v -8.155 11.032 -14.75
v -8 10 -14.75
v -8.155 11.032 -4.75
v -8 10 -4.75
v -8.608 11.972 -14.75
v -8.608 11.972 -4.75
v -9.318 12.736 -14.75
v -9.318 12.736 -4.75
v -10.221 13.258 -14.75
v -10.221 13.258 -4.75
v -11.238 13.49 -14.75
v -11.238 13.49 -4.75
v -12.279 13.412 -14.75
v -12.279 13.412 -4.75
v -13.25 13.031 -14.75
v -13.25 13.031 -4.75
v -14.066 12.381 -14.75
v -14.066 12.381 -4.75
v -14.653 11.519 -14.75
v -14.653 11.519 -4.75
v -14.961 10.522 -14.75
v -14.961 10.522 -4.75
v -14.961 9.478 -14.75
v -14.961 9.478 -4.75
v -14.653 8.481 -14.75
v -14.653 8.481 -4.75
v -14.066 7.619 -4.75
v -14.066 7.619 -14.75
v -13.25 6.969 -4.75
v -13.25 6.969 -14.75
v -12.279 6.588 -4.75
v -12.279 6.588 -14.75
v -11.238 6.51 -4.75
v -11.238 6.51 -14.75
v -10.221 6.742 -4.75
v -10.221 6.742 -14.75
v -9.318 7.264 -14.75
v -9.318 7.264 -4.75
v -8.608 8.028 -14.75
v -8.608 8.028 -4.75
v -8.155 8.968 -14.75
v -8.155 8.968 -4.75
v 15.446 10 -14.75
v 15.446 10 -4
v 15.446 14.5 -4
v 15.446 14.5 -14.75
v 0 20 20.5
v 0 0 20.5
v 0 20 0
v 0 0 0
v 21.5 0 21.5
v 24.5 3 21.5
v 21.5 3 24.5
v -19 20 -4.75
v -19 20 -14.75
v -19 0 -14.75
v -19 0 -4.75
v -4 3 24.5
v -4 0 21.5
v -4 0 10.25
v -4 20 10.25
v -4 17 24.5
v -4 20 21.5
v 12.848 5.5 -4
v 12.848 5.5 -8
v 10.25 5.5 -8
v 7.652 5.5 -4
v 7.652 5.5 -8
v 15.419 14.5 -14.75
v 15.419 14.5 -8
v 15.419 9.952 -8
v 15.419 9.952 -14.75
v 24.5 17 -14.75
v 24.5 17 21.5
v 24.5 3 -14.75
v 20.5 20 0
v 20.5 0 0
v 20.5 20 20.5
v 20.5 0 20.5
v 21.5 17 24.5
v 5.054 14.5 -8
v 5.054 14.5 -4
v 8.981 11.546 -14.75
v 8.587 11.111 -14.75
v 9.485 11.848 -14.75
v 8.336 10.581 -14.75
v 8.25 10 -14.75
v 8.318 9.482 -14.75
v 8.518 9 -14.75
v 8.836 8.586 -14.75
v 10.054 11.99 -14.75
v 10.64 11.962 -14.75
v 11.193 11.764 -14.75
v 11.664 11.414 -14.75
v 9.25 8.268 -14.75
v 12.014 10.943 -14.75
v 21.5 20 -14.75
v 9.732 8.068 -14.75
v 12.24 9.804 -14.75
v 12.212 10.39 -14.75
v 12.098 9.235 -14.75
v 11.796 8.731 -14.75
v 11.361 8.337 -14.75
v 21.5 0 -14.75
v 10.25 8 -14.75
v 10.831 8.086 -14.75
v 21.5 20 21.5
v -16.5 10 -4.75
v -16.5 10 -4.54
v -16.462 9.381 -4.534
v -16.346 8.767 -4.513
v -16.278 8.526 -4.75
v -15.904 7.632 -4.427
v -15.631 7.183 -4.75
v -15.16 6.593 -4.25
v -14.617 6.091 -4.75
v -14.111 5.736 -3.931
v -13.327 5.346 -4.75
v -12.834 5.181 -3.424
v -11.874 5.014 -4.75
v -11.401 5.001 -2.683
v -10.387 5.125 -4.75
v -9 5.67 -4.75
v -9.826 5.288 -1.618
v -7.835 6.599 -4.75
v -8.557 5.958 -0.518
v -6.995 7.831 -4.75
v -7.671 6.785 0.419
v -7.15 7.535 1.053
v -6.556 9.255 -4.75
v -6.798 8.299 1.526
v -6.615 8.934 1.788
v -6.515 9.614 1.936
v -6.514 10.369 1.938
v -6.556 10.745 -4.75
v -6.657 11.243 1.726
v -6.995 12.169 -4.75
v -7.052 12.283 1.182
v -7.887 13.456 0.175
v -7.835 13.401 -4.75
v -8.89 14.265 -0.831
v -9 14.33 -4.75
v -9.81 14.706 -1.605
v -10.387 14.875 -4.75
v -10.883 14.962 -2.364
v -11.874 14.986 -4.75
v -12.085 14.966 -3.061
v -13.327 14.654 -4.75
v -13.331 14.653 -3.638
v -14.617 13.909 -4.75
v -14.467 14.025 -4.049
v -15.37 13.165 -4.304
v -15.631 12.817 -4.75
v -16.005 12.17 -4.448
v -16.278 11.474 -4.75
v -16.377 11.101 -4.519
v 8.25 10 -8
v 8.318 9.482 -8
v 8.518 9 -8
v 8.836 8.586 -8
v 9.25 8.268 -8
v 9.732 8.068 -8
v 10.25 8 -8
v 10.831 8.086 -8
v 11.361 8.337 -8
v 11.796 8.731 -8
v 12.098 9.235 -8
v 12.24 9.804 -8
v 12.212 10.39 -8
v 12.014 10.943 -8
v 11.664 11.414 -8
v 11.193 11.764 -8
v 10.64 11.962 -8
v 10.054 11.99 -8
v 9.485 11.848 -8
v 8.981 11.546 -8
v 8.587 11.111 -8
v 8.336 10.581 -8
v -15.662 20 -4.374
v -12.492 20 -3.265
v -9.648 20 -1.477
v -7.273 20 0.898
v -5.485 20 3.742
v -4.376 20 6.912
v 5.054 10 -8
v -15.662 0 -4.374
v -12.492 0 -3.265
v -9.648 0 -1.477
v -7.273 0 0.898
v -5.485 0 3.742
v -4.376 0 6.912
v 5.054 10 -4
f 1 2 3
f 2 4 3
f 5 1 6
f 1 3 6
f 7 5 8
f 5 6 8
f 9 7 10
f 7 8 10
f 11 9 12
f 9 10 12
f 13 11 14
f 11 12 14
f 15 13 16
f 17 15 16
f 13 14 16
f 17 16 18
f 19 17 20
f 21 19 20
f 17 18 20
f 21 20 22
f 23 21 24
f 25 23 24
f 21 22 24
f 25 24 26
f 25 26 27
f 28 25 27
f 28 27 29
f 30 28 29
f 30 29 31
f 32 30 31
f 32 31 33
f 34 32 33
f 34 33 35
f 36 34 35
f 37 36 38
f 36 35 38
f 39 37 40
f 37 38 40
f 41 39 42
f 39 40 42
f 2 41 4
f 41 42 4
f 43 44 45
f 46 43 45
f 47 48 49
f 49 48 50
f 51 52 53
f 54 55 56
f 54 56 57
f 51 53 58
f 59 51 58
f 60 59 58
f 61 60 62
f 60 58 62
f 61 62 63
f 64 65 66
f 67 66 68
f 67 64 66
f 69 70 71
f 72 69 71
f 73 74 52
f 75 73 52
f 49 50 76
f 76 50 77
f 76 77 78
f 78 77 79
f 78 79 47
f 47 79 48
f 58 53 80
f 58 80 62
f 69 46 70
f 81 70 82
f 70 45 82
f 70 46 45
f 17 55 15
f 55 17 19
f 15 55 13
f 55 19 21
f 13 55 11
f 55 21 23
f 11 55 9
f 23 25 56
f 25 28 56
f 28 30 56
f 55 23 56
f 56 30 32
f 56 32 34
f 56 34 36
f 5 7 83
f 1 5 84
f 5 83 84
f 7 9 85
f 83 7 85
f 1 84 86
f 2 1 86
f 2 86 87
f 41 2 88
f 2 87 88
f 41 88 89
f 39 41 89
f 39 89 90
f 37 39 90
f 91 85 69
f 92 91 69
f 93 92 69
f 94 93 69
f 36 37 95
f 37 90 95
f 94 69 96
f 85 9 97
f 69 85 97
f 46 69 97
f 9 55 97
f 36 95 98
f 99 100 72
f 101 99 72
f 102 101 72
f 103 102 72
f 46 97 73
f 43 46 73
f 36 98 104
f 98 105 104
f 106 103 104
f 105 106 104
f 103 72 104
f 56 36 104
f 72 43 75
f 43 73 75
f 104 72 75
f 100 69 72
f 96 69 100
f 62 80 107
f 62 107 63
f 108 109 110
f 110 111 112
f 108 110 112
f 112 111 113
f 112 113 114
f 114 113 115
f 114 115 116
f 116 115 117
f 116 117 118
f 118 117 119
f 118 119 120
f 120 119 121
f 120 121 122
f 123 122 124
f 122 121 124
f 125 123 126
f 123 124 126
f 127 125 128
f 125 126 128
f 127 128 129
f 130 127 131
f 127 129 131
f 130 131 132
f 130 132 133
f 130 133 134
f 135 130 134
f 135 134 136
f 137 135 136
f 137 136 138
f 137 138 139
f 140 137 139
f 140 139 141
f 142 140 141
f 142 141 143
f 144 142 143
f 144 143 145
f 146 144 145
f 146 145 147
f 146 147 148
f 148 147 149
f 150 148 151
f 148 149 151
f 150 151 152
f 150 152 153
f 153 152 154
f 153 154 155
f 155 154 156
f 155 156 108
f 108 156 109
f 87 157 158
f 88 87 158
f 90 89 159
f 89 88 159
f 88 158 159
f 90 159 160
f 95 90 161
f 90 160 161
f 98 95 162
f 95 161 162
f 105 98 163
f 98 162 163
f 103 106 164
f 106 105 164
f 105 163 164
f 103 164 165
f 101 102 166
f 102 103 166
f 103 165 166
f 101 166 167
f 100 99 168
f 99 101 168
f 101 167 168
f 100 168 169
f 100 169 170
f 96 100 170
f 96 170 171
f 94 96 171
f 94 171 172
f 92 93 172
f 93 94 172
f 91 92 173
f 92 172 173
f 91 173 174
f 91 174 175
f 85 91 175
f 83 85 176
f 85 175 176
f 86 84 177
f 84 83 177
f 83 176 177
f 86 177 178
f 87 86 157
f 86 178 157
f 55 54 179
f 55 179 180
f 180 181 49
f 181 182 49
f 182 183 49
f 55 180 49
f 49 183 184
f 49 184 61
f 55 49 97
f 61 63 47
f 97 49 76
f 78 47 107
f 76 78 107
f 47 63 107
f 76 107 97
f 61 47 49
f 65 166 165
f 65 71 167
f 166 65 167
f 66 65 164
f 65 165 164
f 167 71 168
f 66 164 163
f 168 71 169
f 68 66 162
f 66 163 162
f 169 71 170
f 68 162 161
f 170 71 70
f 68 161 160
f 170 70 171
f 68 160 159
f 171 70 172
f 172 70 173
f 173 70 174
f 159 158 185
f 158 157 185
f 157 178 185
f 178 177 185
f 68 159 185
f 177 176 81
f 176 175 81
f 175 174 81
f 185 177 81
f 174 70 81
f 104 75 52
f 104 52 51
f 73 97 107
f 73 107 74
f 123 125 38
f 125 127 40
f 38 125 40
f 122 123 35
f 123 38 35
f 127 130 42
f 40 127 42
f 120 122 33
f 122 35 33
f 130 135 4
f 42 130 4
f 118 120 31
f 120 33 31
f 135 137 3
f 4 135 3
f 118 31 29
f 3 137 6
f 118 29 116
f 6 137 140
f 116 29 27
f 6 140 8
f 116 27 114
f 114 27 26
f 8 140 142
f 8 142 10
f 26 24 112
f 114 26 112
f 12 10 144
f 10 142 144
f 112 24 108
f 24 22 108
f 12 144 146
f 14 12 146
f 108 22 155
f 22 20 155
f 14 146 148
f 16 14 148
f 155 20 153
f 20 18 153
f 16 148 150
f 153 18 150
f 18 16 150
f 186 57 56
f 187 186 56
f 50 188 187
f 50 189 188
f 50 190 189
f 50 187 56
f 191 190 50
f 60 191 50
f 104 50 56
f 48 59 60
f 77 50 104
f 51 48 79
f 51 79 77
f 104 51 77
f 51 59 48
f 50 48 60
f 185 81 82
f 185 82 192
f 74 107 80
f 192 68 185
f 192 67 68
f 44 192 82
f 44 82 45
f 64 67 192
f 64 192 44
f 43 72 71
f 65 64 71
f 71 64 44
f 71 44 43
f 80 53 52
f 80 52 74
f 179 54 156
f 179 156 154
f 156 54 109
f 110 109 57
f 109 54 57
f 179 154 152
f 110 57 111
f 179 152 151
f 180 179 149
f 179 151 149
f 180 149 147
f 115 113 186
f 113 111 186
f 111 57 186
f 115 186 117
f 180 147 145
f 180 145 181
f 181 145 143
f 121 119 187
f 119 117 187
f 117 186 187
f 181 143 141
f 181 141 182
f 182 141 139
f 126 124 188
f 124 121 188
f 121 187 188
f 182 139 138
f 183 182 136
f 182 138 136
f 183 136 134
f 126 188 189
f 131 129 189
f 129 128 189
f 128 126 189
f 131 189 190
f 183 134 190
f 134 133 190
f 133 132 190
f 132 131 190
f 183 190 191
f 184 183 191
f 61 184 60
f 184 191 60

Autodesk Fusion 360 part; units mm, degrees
sketch "Sketch1" plane through (0, 0, 0) normal (0, 1, 0) x (1, 0, 0)
  line L0 (0, 0) -> (20.5, 0)
  line L1 (20.5, 0) -> (20.5, -20.5)
  line L2 (20.5, -20.5) -> (0, -20.5)
  line L3 (0, -20.5) -> (0, 0)
  line L4 (0, 0) -> (-4, 0)
  line L5 (-4, 0) -> (-4, 4)
  line L6 (-4, 4) -> (0, 4)
  line L7 (0, 4) -> (0, 0)
  line L8 (-4, 4) -> (24.5, 4)
  line L9 (24.5, 4) -> (24.5, -24.5)
  line L10 (24.5, -24.5) -> (-4, -24.5)
  line L11 (-4, -24.5) -> (-4, 4)
  dimension "d1" = 20.5
  dimension "d2" = 20.5
  dimension "d3" = 4
  dimension "d4" = 4
  dimension "d5" = 28.5
  dimension "d6" = 28.5
extrude "Extrude1" add sketch "Sketch1" along normal blind 20
chamfer "Chamfer1" distance 3 angle 45 5 edges at (24.5, 20, 10.25) (10.25, 20, 24.5) (24.5, 10, 24.5) (24.5, 0, 10.25) (10.25, 0, 24.5)
sketch "Sketch2" plane through (0, 0, -4) normal (0, 0, -1) x (-1, 0, 0)
  line L0 (-24.5, 3) -> (-21.5, 0)
  line L1 (-21.5, 0) -> (4, 0)
  line L2 (4, 0) -> (4, 20)
  line L3 (4, 20) -> (-21.5, 20)
  line L4 (-21.5, 20) -> (-24.5, 17)
  line L5 (-24.5, 17) -> (-24.5, 3)
  line L6 (-24.5, 10) -> (-10.25, 10)
  line L7 (-7.6519, 5.5) -> (-5.0538, 10)
  line L8 (-5.0538, 10) -> (-7.6519, 14.5)
  line L9 (-7.6519, 14.5) -> (-12.8481, 14.5)
  line L10 (-12.8481, 14.5) -> (-15.4462, 10)
  line L11 (-15.4462, 10) -> (-12.8481, 5.5)
  line L12 (-12.8481, 5.5) -> (-7.6519, 5.5)
  point P0 (-10.25, 10)
  dimension "d10" = 14.25
  dimension "d11" = 4.5
extrude "Extrude2" add sketch "Sketch2" along normal blind 4
sketch "Sketch3" plane through (0, 0, -8) normal (0, 0, -1) x (-1, 0, 0)
  line L0 (-7.6519, 5.5) -> (-12.8481, 5.5)
  line L1 (-15.4462, 10) -> (-12.8481, 14.5)
  line L2 (-12.8481, 14.5) -> (-7.6519, 14.5)
  line L3 (-7.6519, 14.5) -> (-5.0538, 10)
  line L4 (-5.0538, 10) -> (-7.6519, 5.5)
  line L5 (-24.5, 17) -> (-24.5, 3)
  line L6 (-24.5, 3) -> (-21.5, 0)
  line L7 (-21.5, 0) -> (4, 0)
  line L8 (4, 0) -> (4, 20)
  line L9 (4, 20) -> (-21.5, 20)
  line L10 (-21.5, 20) -> (-24.5, 17)
  line L11 (-7.6519, 14.5) -> (-5.0538, 14.5)
  line L12 (-5.0538, 14.5) -> (-5.0538, 10)
  line L13 (-15.4462, 10) -> (-15.4462, 14.5)
  line L14 (-15.4462, 14.5) -> (-12.8481, 14.5)
extrude "Extrude3" cut sketch "Sketch3" against normal blind 4 contours L1 L13 L14 | L3 L11 L12
sketch "Sketch4" plane through (0, 0, -8) normal (0, 0, -1) x (-1, 0, 0)
  line L0 (-15.4462, 14.5) -> (-5.0538, 14.5)
  line L1 (-5.0538, 14.5) -> (-5.0538, 10)
  line L2 (-5.0538, 10) -> (-7.6519, 5.5)
  line L3 (-7.6519, 5.5) -> (-12.8481, 5.5)
  line L4 (-12.8481, 5.5) -> (-15.4462, 10)
  line L5 (-15.4462, 10) -> (-15.4462, 14.5)
  line L6 (-24.5, 17) -> (-24.5, 3)
  line L7 (-24.5, 3) -> (-21.5, 0)
  line L8 (-21.5, 0) -> (4, 0)
  line L9 (4, 0) -> (4, 20)
  line L10 (4, 20) -> (-21.5, 20)
  line L11 (-21.5, 20) -> (-24.5, 17)
  line L12 (-10.25, 5.5) -> (-10.25, 10)
  circle A0 centre (-10.25, 10) radius 2
  line L13 (-5.0538, 14.5) -> (-15.4186, 14.5)
  line L14 (-15.4186, 14.5) -> (-15.4186, 5.5)
  line L15 (-15.4186, 5.5) -> (-5.0538, 5.5)
  line L16 (-5.0538, 5.5) -> (-5.0538, 14.5)
  line L17 (7, 22) -> (-27, 22)
  line L18 (-27, 22) -> (-27, -2)
  line L19 (-27, -2) -> (7, -2)
  line L20 (7, -2) -> (7, 22)
  dimension "d16" = 4
extrude "Extrude4" add sketch "Sketch4" along normal blind 5 contours L0 L1 L2 L3 L4 L13 L14 L15 L16 | L4 L14 L15 | L2 L15 L16 | L6 L7 L8 L9 L10 L11
extrude "Extrude5" add 1 faces at (0.0833, 10, -13) along direction (0, 0, -1) blind 1.75
sketch "Sketch5" plane through (-4, 0, 0) normal (-1, 0, 0) x (0, 0, 1)
  line L0 (21.5, 0) -> (24.5, 3)
  line L1 (24.5, 3) -> (24.5, 17)
  line L2 (24.5, 17) -> (21.5, 20)
  line L3 (21.5, 20) -> (-14.75, 20)
  line L4 (-14.75, 20) -> (-14.75, 0)
  line L5 (-14.75, 0) -> (21.5, 0)
  line L6 (-14.75, 20) -> (-4.75, 20)
  line L7 (-4.75, 20) -> (-4.75, 0)
  line L8 (-4.75, 0) -> (-14.75, 0)
  line L9 (-14.75, 0) -> (-14.75, 20)
  dimension "d21" = 10
extrude "Extrude6" add sketch "Sketch5" along normal blind 15 contours L3 L4 L5 L6 L7 L8 L9
sketch "Sketch6" plane through (0, 0, -4.75) normal (0, 0, 1) x (1, 0, 0)
  line L0 (-4, 0) -> (-4, 20)
  line L1 (-4, 20) -> (-19, 20)
  line L2 (-19, 20) -> (-19, 0)
  line L3 (-19, 0) -> (-4, 0)
  line L4 (-19, 10) -> (-11.5, 10)
  circle A0 centre (-11.5, 10) radius 3.5
  dimension "d24" = 7.5
  dimension "d25" = 7
extrude "Extrude7" cut sketch "Sketch6" against normal blind 10 contours A0
sketch "Sketch7" plane through (0, 0, 0) normal (0, -1, 0) x (1, 0, 0)
  line L0 (21.5, -14.75) -> (21.5, 21.5)
  line L1 (21.5, 21.5) -> (-4, 21.5)
  line L2 (-4, 21.5) -> (-4, -4.75)
  line L3 (-4, -4.75) -> (-19, -4.75)
  line L4 (-19, -4.75) -> (-19, -14.75)
  line L5 (-19, -14.75) -> (21.5, -14.75)
  line L6 (0, 20.5) -> (20.5, 20.5)
  line L7 (20.5, 20.5) -> (20.5, 0)
  line L8 (20.5, 0) -> (0, 0)
  line L9 (0, 0) -> (0, 20.5)
  line L10 (-19, -4.75) -> (-19, 10.25)
  circle A0 centre (-19, 10.25) radius 15
  dimension "d28" = 15
extrude "Extrude8" add sketch "Sketch7" against normal blind 20 contours L2 L3 A0
sketch "Sketch8" plane through (0, 0, -14.75) normal (0, 0, -1) x (-1, 0, 0)
  circle A0 centre (11.5, 10) radius 3.5
  line L0 (-15.4462, 14.5) -> (-15.4186, 14.5)
  line L1 (-15.4186, 14.5) -> (-15.4186, 9.9523)
  line L2 (-15.4186, 9.9523) -> (-15.4462, 10)
  line L3 (-15.4462, 10) -> (-15.4462, 14.5)
  circle A1 centre (-10.25, 10) radius 2
  line L4 (-21.5, 20) -> (-24.5, 17)
  line L5 (-24.5, 17) -> (-24.5, 3)
  line L6 (-24.5, 3) -> (-21.5, 0)
  line L7 (-21.5, 0) -> (19, 0)
  line L8 (19, 0) -> (19, 20)
  line L9 (19, 20) -> (-21.5, 20)
  circle A2 centre (11.5, 10) radius 5
  dimension "d31" = 10
extrude "Extrude9" cut sketch "Sketch8" along normal blind -10 and the other way blind 27 contours A2
extrude "Extrude10" cut 1 faces at (-11.9678, 9.7747, -4.75) along direction (0, 0, 1) blind 20
